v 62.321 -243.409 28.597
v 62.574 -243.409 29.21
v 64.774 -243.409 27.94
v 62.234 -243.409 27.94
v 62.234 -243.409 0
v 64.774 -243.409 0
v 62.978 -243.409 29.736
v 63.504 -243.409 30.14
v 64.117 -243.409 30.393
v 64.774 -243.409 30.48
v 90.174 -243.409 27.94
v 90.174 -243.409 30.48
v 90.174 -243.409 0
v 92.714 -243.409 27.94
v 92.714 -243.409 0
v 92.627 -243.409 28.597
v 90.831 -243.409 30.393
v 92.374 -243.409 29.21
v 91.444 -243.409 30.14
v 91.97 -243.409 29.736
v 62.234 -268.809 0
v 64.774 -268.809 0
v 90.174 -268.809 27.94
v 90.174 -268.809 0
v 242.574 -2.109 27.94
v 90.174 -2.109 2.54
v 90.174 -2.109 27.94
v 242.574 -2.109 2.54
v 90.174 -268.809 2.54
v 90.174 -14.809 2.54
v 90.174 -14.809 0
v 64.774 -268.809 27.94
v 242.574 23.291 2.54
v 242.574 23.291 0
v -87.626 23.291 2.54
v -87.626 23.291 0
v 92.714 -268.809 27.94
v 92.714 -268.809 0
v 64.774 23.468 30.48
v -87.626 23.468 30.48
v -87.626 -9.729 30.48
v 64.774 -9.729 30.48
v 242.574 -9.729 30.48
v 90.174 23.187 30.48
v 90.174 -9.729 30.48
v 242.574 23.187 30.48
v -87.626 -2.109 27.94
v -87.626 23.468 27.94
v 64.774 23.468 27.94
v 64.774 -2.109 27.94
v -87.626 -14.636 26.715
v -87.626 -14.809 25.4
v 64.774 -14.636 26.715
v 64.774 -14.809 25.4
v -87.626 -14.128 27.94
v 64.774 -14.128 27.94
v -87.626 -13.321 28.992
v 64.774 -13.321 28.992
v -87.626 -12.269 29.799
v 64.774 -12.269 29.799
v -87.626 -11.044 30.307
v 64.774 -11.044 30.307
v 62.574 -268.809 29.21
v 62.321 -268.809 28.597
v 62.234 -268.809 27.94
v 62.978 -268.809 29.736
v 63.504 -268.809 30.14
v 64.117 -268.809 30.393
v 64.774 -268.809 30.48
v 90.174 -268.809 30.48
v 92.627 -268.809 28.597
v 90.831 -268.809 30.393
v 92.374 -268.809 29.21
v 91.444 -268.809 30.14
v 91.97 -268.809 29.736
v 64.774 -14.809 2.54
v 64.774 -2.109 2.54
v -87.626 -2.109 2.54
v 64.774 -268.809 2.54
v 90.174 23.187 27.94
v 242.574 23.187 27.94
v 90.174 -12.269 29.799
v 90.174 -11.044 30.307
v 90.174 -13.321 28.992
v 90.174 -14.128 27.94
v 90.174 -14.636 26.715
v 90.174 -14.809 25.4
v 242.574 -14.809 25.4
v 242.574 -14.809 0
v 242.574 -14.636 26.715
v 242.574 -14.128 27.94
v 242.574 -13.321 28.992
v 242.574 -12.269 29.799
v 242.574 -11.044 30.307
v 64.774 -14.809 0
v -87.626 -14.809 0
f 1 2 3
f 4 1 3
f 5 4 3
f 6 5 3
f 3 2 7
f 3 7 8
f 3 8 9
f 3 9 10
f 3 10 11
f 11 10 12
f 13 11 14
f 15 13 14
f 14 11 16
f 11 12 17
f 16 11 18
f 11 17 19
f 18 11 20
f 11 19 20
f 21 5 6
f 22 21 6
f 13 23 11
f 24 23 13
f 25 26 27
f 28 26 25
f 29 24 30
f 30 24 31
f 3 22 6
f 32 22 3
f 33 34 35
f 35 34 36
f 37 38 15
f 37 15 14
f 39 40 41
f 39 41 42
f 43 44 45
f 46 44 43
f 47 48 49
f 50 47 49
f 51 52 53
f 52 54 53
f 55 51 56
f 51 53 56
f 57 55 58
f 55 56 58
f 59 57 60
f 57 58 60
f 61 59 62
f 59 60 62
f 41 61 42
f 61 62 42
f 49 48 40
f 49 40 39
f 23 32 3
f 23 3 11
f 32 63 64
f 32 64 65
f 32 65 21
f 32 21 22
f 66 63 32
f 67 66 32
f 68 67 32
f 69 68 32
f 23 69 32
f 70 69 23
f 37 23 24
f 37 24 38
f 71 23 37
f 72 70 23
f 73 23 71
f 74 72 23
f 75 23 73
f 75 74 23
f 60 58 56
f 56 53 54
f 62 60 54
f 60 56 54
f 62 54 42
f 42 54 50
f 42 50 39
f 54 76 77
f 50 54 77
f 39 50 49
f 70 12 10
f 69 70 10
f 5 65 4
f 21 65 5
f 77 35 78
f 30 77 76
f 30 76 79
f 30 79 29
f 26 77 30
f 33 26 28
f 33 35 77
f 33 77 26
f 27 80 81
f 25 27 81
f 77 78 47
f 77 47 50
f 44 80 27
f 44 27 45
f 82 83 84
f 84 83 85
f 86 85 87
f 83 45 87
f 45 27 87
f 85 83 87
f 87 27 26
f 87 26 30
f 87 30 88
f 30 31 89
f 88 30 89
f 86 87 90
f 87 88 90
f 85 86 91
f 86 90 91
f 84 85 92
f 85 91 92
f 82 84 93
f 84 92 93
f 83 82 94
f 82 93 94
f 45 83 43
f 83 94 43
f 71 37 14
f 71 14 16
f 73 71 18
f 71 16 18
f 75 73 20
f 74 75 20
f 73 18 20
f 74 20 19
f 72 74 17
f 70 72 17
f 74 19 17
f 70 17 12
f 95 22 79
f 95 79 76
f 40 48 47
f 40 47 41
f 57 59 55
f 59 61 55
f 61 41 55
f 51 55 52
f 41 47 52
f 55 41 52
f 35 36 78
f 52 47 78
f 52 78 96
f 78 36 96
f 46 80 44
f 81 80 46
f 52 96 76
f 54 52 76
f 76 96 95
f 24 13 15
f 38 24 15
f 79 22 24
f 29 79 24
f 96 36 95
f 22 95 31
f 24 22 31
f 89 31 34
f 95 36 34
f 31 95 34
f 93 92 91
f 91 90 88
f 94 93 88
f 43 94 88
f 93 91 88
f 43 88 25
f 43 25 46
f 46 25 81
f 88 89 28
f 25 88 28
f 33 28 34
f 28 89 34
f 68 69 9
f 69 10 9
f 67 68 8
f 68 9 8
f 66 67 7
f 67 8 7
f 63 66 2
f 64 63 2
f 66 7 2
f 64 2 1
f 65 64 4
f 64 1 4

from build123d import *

# Parameters (mm, degrees)
F0_W     = 152.4
F0_H     = 38.1
F0_W_2   = 25.4
F0_H_2   = 254
F1_DEPTH = 2.54
F2_W     = 152.4
F2_H     = 12.7
F3_DEPTH = 25.4
F4_W     = 152.4
F4_H     = 25.576886
F4_H_2   = 12.7
F5_DEPTH = 2.54
F6_W     = 152.4
F6_H     = 25.295634
F6_H_2   = 12.7
F7_DEPTH = 2.54
F9_DEPTH = 25.4
F10_R    = 2.54
F11_R    = 2.54
F12_R    = 5.08
F13_R    = 5.08


with BuildPart() as f1:
    # F0 (on Top) → F1 (new body)
    with BuildSketch(Plane.XY):
        with Locations((-11.425986, 4.241091)):
            Rectangle(F0_W, F0_H)
        with Locations((77.474014, 4.241091)):
            Rectangle(F0_W_2, F0_H)
        with Locations((77.474014, -141.808909)):
            Rectangle(F0_W_2, F0_H_2)
        with Locations((166.374014, 4.241091)):
            Rectangle(F0_W, F0_H)
    extrude(amount=F1_DEPTH)

    # F2 (on face) → F3 (join)
    with BuildSketch(Plane.XY.offset(2.54)):
        with Locations((-11.425986, -8.458909)):
            Rectangle(F2_W, F2_H)
        with Locations((166.374014, -8.458909)):
            Rectangle(F2_W, F2_H)
    extrude(amount=F3_DEPTH)

    # F4 (on face) → F5 (join)
    with BuildSketch(Plane.XY.offset(27.94)):
        with Locations((-11.425986, 10.679534)):
            Rectangle(F4_W, F4_H)
        with Locations((-11.425986, -8.458909)):
            Rectangle(F4_W, F4_H_2)
    extrude(amount=F5_DEPTH)

    # F6 (on face) → F7 (join)
    with BuildSketch(Plane.XY.offset(27.94)):
        with Locations((166.374014, 10.538908)):
            Rectangle(F6_W, F6_H)
        with Locations((166.374014, -8.458909)):
            Rectangle(F6_W, F6_H_2)
    extrude(amount=F7_DEPTH)

    # F12
    f12_edges = [f1.edges().sort_by_distance(p)[0] for p in [
        (166.374014, -14.808909, 30.48),
    ]]
    fillet(f12_edges, radius=F12_R)

    # F13
    f13_edges = [f1.edges().sort_by_distance(p)[0] for p in [
        (-11.425986, -14.808909, 30.48),
    ]]
    fillet(f13_edges, radius=F13_R)


with BuildPart() as f9:
    # F8 (on face) → F9 (new body)
    with BuildSketch(Plane.XZ.offset(268.808909)):
        Polygon((62.234014, 0), (64.774014, 0), (64.774014, 2.54), (64.774014, 27.94), (90.174014, 27.94), (90.174014, 2.54), (90.174014, 0), (92.714014, 0), (92.714014, 30.48), (62.234014, 30.48), align=None)
    extrude(amount=-F9_DEPTH)

    # F10
    f10_edges = [f9.edges().sort_by_distance(p)[0] for p in [
        (92.714014, -256.108909, 30.48),
    ]]
    fillet(f10_edges, radius=F10_R)

    # F11
    f11_edges = [f9.edges().sort_by_distance(p)[0] for p in [
        (62.234014, -256.108909, 30.48),
    ]]
    fillet(f11_edges, radius=F11_R)


solid = Compound([f1.part, f9.part])
